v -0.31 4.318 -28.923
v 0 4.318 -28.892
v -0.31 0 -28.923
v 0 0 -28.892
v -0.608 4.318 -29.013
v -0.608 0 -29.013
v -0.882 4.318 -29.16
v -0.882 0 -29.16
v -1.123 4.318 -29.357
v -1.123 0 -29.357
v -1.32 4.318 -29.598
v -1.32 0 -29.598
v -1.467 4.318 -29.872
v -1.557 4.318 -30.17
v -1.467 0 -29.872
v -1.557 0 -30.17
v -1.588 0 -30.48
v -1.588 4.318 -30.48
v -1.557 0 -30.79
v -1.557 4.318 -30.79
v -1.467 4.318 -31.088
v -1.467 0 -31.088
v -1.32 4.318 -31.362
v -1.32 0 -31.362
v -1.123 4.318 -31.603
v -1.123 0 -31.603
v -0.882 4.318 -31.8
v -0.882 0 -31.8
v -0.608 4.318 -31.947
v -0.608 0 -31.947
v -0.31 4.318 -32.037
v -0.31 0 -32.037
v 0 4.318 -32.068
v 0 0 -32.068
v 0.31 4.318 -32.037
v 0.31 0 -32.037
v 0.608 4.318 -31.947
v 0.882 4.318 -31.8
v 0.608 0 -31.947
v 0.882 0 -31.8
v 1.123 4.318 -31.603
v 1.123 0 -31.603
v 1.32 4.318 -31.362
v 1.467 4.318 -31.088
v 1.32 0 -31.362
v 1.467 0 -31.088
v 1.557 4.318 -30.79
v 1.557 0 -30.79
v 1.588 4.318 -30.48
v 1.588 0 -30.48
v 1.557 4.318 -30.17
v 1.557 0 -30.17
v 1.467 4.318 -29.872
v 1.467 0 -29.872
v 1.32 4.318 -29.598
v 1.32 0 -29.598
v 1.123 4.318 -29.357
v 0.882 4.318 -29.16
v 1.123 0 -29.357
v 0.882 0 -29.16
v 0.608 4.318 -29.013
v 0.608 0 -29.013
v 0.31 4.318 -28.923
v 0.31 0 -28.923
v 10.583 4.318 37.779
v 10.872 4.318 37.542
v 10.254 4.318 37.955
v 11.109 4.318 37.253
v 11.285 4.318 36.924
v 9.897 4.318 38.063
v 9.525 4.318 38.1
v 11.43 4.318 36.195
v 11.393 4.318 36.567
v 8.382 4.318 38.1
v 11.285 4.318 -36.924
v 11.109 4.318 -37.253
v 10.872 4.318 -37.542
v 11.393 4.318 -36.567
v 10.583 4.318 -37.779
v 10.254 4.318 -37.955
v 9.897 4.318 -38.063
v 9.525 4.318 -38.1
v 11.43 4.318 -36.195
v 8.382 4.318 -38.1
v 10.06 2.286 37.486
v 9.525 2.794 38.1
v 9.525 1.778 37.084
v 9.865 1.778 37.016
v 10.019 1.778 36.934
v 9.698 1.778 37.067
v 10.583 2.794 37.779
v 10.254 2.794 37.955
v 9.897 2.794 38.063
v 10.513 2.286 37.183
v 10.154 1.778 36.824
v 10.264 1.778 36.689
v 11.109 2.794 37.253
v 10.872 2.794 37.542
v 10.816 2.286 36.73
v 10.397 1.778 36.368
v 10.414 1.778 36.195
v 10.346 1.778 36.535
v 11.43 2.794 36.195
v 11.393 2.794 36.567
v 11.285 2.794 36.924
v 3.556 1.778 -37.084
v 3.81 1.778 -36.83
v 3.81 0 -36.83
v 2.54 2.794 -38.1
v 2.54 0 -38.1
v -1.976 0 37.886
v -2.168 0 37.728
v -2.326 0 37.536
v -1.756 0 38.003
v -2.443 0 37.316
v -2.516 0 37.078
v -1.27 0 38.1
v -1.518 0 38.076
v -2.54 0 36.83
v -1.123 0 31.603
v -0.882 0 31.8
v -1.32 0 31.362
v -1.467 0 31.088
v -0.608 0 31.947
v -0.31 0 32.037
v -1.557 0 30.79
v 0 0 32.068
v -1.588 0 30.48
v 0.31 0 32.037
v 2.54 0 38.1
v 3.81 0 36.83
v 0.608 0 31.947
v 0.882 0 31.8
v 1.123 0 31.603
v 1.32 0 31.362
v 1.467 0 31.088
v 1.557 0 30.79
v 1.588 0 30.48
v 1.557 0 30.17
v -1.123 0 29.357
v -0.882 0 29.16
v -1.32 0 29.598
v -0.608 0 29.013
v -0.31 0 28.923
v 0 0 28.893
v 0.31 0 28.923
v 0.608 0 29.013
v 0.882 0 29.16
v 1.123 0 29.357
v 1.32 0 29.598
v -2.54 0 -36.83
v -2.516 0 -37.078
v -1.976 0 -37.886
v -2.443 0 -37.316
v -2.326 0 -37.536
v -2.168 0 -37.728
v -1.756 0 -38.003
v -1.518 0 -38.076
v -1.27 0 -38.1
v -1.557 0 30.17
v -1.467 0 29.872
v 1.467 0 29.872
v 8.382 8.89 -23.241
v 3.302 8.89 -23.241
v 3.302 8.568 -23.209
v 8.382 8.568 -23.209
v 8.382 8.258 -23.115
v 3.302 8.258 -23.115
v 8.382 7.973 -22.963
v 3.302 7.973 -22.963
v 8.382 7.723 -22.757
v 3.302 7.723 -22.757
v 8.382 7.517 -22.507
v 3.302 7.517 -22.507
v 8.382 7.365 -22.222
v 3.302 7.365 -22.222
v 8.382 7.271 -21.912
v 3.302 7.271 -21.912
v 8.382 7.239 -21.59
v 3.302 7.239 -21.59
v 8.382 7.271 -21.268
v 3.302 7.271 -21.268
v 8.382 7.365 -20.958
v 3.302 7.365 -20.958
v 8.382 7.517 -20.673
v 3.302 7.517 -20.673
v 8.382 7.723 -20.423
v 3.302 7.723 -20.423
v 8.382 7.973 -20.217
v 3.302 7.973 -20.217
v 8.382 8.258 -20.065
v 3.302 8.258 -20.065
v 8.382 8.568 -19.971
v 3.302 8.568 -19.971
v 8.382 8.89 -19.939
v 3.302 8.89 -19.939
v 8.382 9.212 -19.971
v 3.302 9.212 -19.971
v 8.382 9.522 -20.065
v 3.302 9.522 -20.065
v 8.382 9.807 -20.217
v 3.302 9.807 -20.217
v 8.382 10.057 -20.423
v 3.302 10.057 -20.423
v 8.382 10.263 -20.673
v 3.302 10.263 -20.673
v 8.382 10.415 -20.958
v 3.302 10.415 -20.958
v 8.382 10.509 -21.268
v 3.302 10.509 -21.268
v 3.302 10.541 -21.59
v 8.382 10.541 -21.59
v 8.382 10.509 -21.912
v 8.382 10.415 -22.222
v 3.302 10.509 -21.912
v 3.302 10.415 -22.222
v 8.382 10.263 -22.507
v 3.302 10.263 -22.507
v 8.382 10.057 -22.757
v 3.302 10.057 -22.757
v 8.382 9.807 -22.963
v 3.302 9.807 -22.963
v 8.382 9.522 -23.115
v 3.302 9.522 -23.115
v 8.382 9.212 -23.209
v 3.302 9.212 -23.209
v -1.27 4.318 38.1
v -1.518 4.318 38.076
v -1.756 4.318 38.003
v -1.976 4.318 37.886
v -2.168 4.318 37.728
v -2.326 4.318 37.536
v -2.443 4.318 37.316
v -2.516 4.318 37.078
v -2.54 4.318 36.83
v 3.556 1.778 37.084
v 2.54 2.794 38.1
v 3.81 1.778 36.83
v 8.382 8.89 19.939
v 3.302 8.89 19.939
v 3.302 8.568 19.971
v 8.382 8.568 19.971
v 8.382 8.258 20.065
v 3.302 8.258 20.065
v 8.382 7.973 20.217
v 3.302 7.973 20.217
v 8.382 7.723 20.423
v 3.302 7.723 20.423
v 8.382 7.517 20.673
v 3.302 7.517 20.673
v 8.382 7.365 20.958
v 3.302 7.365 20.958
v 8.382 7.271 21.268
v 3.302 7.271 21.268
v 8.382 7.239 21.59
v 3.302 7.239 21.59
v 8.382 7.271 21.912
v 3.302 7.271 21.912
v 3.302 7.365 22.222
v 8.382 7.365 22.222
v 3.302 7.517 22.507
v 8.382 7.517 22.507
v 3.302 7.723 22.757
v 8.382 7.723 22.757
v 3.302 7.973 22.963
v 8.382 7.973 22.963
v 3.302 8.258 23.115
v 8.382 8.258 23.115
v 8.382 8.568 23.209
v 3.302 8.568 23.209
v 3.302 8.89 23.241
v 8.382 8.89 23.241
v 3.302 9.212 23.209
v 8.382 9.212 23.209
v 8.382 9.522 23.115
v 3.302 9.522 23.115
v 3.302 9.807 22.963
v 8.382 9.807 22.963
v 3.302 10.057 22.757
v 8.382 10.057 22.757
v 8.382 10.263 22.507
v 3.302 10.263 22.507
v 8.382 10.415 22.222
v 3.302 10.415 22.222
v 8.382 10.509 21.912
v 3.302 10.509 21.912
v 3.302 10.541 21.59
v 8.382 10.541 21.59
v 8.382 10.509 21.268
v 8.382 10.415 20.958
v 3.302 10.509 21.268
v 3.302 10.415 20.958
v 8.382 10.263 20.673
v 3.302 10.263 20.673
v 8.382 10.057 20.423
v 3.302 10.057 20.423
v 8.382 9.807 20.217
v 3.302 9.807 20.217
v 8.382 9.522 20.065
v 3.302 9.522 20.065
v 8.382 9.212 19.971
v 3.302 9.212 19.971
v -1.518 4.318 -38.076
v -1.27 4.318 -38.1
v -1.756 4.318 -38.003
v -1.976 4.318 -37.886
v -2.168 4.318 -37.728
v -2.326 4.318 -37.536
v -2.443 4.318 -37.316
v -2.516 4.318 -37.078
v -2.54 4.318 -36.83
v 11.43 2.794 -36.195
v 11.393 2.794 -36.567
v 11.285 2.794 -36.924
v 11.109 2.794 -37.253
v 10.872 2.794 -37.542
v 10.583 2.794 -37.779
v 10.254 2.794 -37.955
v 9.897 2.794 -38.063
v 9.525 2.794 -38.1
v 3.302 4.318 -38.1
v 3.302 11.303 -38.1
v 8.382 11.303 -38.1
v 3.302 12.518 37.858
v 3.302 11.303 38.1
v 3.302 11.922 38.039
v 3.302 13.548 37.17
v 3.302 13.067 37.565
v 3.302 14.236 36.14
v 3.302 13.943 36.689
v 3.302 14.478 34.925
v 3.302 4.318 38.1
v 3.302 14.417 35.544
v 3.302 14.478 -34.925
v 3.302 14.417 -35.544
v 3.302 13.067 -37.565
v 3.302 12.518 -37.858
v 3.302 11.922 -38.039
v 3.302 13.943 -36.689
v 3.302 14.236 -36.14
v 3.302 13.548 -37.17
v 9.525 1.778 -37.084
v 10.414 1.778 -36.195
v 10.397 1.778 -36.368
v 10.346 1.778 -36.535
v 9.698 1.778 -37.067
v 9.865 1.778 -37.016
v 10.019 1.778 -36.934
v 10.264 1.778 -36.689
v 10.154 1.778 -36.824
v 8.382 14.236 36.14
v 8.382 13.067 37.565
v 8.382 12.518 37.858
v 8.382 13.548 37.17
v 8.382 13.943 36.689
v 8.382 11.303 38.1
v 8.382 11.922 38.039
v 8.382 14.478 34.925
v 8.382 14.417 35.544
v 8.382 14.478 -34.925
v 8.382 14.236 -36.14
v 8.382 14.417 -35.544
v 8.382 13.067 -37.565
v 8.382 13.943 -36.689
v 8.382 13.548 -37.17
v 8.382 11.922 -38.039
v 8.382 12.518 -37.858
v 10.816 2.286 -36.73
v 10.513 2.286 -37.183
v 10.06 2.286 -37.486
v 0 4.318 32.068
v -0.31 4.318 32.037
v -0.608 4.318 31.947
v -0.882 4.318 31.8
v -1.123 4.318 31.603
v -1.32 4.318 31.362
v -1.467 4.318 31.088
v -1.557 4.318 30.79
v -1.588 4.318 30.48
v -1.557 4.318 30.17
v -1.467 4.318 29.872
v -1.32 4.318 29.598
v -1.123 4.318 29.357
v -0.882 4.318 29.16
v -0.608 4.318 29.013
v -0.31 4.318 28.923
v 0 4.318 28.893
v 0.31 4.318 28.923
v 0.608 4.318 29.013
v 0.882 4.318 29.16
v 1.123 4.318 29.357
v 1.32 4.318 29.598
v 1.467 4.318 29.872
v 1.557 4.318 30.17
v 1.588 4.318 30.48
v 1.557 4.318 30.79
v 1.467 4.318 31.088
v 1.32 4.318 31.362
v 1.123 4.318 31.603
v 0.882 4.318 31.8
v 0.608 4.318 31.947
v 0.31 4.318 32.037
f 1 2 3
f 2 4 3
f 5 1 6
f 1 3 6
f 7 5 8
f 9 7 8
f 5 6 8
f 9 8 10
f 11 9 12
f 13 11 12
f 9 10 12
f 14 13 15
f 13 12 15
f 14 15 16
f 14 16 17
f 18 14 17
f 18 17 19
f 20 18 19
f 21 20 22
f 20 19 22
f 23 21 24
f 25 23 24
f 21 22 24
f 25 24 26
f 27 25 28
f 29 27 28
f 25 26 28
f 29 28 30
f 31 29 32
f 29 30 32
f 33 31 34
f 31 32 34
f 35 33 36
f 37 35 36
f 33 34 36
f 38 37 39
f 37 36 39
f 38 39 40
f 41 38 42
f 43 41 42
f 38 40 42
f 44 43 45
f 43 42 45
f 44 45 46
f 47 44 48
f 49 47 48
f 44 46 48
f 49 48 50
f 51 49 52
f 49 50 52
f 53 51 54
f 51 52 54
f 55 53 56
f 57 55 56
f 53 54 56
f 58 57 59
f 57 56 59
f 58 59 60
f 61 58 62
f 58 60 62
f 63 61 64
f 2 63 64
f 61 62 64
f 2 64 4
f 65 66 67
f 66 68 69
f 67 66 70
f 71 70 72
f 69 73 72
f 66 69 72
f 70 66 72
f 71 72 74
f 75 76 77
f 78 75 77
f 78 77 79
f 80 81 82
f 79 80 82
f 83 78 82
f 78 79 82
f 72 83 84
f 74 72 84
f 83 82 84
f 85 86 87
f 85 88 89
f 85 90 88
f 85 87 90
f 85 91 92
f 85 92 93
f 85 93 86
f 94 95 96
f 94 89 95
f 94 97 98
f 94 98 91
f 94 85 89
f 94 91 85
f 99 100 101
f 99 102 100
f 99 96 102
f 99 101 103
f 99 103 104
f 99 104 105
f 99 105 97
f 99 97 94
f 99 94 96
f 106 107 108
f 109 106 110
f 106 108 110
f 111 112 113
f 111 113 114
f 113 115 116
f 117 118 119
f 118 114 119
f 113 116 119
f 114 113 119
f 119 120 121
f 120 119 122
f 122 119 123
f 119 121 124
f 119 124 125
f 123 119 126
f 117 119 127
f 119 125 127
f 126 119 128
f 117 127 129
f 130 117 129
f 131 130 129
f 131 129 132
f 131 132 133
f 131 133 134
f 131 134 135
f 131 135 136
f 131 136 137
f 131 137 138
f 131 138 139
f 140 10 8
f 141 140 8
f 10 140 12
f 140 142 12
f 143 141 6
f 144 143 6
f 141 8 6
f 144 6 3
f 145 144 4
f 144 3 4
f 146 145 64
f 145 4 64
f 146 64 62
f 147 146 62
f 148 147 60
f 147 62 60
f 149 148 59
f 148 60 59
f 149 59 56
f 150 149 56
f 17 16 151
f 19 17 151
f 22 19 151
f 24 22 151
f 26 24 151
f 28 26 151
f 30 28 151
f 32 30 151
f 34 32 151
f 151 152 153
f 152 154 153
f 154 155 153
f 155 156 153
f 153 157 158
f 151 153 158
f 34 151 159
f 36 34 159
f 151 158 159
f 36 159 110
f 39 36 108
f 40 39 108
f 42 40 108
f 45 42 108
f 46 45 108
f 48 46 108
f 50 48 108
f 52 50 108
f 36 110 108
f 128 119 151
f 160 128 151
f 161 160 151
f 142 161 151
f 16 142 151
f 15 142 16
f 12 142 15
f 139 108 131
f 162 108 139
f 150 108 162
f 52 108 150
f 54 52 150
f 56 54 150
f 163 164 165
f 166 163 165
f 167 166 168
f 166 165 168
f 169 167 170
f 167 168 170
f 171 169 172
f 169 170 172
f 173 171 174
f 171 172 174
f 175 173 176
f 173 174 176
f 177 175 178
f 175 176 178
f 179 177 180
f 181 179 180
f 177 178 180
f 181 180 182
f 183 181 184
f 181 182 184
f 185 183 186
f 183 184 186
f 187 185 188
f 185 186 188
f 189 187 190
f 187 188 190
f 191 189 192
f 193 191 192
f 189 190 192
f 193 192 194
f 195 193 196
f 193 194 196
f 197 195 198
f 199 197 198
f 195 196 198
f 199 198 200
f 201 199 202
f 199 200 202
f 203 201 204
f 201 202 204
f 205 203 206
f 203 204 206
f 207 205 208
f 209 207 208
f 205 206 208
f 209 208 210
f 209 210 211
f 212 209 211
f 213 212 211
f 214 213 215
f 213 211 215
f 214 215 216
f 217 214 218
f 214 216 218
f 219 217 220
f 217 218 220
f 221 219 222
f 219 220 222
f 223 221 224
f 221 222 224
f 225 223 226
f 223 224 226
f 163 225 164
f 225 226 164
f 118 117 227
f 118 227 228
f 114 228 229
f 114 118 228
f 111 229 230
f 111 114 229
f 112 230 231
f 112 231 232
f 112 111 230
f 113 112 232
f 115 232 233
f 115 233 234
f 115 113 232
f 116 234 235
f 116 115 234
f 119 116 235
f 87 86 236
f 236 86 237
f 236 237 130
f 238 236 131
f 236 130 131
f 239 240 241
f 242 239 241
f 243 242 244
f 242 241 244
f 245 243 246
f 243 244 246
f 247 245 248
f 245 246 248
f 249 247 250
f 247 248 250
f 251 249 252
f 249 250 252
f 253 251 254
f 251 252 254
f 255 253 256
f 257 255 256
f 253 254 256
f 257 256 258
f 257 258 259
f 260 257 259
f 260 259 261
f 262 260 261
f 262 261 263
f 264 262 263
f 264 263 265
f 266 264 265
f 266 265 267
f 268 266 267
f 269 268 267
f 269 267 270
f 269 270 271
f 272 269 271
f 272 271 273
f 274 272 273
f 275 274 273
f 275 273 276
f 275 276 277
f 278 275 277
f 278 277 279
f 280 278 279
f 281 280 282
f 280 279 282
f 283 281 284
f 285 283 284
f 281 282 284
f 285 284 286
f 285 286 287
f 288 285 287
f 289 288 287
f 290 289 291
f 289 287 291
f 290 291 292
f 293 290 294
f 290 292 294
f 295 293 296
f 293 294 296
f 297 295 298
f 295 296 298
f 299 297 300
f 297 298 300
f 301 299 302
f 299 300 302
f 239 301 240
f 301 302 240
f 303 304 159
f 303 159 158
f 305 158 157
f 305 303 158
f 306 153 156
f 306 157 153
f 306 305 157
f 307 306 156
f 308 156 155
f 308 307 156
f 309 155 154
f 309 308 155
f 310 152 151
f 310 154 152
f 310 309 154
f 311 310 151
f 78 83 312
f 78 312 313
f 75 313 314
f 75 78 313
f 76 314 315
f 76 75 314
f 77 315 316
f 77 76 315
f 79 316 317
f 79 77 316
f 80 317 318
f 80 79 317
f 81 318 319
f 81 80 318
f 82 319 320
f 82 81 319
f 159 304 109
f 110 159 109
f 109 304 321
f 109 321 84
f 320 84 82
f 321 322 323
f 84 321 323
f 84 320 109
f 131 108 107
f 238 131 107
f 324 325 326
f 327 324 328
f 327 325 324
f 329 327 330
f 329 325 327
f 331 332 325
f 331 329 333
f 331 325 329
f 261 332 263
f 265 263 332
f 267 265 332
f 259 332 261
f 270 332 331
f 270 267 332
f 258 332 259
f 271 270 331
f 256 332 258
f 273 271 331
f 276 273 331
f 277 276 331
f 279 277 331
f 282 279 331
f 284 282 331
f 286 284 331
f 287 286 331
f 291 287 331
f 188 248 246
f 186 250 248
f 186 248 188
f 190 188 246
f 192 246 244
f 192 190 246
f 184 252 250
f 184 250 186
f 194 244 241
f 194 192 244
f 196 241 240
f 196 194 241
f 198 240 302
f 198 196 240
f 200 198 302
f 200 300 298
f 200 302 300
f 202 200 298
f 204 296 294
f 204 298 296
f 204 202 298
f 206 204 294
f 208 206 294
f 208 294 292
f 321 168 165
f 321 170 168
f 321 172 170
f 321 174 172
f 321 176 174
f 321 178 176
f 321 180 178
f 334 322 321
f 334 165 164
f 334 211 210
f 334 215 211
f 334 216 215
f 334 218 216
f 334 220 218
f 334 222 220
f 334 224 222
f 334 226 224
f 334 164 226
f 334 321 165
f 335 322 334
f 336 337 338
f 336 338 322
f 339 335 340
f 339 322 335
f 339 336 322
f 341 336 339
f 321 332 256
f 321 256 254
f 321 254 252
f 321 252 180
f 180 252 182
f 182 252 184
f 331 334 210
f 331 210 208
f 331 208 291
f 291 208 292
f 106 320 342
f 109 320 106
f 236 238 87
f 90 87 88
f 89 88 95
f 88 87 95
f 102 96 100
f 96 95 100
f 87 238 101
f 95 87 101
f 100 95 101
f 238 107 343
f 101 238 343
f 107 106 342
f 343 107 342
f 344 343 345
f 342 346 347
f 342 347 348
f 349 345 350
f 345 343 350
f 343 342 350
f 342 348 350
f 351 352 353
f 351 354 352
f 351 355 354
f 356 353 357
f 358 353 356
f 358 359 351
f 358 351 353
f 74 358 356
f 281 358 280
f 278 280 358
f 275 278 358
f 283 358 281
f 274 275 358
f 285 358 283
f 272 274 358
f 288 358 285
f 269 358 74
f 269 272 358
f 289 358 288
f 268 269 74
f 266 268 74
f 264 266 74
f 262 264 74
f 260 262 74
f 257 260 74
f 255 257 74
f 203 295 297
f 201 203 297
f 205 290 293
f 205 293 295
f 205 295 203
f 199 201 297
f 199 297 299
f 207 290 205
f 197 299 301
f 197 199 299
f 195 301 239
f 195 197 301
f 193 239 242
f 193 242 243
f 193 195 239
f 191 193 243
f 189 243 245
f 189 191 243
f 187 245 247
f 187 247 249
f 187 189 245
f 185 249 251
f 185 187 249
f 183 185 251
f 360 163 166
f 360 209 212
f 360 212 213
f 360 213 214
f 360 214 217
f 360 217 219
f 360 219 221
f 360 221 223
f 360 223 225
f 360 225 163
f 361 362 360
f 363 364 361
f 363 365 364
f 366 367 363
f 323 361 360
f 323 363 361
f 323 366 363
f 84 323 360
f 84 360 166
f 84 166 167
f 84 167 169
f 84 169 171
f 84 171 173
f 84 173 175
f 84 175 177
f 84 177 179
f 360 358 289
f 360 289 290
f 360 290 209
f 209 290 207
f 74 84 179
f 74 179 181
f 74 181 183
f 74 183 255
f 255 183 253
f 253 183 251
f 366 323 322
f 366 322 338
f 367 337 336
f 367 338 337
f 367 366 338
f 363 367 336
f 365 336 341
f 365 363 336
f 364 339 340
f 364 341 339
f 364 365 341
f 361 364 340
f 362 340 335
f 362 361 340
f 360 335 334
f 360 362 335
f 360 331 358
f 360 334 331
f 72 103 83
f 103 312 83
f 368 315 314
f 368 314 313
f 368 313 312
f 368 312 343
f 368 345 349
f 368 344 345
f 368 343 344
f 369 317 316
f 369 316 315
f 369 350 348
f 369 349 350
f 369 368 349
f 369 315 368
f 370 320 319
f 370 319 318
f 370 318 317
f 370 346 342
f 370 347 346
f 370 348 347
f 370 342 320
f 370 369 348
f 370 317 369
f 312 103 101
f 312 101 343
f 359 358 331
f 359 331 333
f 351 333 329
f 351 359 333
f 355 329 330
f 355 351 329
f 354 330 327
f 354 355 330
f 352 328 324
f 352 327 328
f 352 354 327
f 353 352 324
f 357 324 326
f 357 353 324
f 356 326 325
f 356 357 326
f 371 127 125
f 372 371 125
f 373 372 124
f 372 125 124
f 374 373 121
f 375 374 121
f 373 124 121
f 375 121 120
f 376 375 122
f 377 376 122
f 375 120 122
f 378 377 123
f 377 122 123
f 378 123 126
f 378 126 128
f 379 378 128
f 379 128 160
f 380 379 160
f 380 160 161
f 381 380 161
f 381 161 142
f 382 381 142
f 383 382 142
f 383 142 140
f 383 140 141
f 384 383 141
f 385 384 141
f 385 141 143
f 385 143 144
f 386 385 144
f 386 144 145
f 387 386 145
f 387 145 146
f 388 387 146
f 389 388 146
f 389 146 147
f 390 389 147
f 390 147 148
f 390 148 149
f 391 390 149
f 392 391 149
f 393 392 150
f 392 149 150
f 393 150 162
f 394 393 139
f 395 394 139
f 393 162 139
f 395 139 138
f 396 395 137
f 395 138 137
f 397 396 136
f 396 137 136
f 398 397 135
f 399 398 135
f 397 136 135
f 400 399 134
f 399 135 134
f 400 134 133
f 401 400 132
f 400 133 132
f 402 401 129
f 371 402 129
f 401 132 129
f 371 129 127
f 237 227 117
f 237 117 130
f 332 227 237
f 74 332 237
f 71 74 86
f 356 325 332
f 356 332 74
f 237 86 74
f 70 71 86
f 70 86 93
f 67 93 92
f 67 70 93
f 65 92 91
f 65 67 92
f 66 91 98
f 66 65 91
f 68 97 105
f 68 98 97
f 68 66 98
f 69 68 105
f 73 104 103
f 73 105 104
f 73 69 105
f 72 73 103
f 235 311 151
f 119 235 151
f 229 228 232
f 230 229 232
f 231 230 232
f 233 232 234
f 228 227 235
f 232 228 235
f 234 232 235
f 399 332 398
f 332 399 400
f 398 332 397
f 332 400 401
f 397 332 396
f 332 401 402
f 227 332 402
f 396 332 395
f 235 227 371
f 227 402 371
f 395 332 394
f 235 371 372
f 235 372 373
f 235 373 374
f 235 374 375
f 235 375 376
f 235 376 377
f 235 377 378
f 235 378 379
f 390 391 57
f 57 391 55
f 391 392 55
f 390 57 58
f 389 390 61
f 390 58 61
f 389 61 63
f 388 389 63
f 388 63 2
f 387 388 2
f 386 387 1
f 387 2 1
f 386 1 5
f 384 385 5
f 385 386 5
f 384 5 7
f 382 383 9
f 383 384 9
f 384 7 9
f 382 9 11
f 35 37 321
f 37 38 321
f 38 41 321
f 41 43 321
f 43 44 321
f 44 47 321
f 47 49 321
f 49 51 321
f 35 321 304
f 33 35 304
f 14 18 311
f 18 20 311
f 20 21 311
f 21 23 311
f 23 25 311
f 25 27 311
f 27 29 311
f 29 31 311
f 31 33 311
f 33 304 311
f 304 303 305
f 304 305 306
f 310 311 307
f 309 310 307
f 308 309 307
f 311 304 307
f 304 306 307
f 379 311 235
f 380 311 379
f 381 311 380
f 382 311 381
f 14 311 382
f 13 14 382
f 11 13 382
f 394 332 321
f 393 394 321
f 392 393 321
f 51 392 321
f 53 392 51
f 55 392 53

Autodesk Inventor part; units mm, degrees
ref_plane "YZ Plane" through (0, 0, 0) normal (1, 0, 0) x (0, 1, 0)
ref_plane "XZ Plane" through (0, 0, 0) normal (0, 1, 0) x (-1, 0, 0)
ref_plane "XY Plane" through (0, 0, 0) normal (0, 0, 1) x (1, 0, 0)
sketch "Sketch1" plane through (0, 0, 0) normal (0, 0, 1) x (1, 0, 0)
  line L0 (0, 17.3736) -> (0, -2.8956) projected
  line L1 (-5.334, 0) -> (14.224, 0) projected
  line L2 (3.81, 1.778) -> (-2.54, 1.778)
  line L3 (-2.54, 1.778) -> (-2.54, 0)
  line L4 (-2.54, 0) -> (3.81, 0)
  line L5 (3.81, 0) -> (3.81, 1.778)
  line L6 (3.81, 1.778) -> (11.43, 1.778)
  line L7 (11.43, 1.778) -> (11.43, 4.318)
  line L8 (11.43, 4.318) -> (-2.54, 4.318)
  line L9 (-2.54, 4.318) -> (-2.54, 1.778)
  line L10 (8.382, 4.318) -> (3.302, 4.318)
  line L11 (3.302, 4.318) -> (3.302, 14.478)
  line L12 (3.302, 14.478) -> (8.382, 14.478)
  line L13 (8.382, 14.478) -> (8.382, 4.318)
  point P0 (0, 0)
  point P1 (0, 0.635)
  dimension "d1" = 2.54
  dimension "d2" = 1.778
  dimension "d25" = 2.54
  dimension "d26" = 10.16
  dimension "d27" = 5.08
  dimension "d49" = 3.302
  dimension "d50" = 2.54
  dimension "d51" = 11.43
  dimension "d52" = 3.81
extrude "Extrusion1" add sketch "Sketch1" along normal mid plane 76.2
sketch "Sketch2" plane through (-2.54, 4.318, 38.1) normal (0, 1, 0) x (1, 0, 0)
  line L0 (13.97, 76.2) -> (13.97, 0) projected
  line L1 (0, 76.2) -> (13.97, 76.2) projected
  line L2 (13.97, 0) -> (0, 0) projected
  line L3 (0, 76.2) -> (0, 0)
  line L4 (16.764, 38.1) -> (-2.794, 38.1) projected
  point P0 (2.54, 38.1)
  point P1 (2.54, 68.58)
  point P2 (2.54, 38.1)
  point P3 (2.54, 7.62)
  dimension "d6" = 30.48
  dimension "d7" = 30.48
  dimension "d48" = 2.54
hole "Hole1" at (0, 4.318, -30.48) at (0, 4.318, 30.48) direction (0, -1, 0) diameter 3.175 end through all
fillet "Fillet4" radius 1.905 2 edges at (11.43, 3.048, 38.1) (11.43, 3.048, -38.1)
chamfer "Chamfer4" distance 1.016 angle 45 5 edges at (11.43, 1.778, 0) (10.872, 1.778, 37.542) (6.6675, 1.778, 38.1) (10.872, 1.778, -37.542) (6.6675, 1.778, -38.1)
chamfer "Chamfer1" distance 1.27 angle 45 2 edges at (3.81, 0.889, 38.1) (3.81, 0.889, -38.1)
fillet "Fillet3" radius 1.27 2 edges at (-2.54, 2.159, -38.1) (-2.54, 2.159, 38.1)
fillet "Fillet5" radius 3.175 2 edges at (5.842, 14.478, 38.1) (5.842, 14.478, -38.1)
sketch "Sketch3" plane through (8.382, 4.318, 38.1) normal (1, 0, 0) x (0, 0, -1)
  line L0 (74.93, -4.318) -> (1.27, -4.318) projected
  line L1 (38.1, -7.2136) -> (38.1, 13.0556) projected
  point P0 (38.1, -4.318)
  point P1 (16.51, 4.572)
  point P2 (59.69, 4.572)
  dimension "d38" = 43.18
  dimension "d39" = 21.59
  dimension "d40" = 8.89
hole "Hole2" at (8.382, 8.89, 21.59) at (8.382, 8.89, -21.59) direction (-1, 0, 0) diameter 3.302 end through all
equation "\"d39\" = 0.5 * d38"
properties part number "J007812" material "VERO BLACK"
